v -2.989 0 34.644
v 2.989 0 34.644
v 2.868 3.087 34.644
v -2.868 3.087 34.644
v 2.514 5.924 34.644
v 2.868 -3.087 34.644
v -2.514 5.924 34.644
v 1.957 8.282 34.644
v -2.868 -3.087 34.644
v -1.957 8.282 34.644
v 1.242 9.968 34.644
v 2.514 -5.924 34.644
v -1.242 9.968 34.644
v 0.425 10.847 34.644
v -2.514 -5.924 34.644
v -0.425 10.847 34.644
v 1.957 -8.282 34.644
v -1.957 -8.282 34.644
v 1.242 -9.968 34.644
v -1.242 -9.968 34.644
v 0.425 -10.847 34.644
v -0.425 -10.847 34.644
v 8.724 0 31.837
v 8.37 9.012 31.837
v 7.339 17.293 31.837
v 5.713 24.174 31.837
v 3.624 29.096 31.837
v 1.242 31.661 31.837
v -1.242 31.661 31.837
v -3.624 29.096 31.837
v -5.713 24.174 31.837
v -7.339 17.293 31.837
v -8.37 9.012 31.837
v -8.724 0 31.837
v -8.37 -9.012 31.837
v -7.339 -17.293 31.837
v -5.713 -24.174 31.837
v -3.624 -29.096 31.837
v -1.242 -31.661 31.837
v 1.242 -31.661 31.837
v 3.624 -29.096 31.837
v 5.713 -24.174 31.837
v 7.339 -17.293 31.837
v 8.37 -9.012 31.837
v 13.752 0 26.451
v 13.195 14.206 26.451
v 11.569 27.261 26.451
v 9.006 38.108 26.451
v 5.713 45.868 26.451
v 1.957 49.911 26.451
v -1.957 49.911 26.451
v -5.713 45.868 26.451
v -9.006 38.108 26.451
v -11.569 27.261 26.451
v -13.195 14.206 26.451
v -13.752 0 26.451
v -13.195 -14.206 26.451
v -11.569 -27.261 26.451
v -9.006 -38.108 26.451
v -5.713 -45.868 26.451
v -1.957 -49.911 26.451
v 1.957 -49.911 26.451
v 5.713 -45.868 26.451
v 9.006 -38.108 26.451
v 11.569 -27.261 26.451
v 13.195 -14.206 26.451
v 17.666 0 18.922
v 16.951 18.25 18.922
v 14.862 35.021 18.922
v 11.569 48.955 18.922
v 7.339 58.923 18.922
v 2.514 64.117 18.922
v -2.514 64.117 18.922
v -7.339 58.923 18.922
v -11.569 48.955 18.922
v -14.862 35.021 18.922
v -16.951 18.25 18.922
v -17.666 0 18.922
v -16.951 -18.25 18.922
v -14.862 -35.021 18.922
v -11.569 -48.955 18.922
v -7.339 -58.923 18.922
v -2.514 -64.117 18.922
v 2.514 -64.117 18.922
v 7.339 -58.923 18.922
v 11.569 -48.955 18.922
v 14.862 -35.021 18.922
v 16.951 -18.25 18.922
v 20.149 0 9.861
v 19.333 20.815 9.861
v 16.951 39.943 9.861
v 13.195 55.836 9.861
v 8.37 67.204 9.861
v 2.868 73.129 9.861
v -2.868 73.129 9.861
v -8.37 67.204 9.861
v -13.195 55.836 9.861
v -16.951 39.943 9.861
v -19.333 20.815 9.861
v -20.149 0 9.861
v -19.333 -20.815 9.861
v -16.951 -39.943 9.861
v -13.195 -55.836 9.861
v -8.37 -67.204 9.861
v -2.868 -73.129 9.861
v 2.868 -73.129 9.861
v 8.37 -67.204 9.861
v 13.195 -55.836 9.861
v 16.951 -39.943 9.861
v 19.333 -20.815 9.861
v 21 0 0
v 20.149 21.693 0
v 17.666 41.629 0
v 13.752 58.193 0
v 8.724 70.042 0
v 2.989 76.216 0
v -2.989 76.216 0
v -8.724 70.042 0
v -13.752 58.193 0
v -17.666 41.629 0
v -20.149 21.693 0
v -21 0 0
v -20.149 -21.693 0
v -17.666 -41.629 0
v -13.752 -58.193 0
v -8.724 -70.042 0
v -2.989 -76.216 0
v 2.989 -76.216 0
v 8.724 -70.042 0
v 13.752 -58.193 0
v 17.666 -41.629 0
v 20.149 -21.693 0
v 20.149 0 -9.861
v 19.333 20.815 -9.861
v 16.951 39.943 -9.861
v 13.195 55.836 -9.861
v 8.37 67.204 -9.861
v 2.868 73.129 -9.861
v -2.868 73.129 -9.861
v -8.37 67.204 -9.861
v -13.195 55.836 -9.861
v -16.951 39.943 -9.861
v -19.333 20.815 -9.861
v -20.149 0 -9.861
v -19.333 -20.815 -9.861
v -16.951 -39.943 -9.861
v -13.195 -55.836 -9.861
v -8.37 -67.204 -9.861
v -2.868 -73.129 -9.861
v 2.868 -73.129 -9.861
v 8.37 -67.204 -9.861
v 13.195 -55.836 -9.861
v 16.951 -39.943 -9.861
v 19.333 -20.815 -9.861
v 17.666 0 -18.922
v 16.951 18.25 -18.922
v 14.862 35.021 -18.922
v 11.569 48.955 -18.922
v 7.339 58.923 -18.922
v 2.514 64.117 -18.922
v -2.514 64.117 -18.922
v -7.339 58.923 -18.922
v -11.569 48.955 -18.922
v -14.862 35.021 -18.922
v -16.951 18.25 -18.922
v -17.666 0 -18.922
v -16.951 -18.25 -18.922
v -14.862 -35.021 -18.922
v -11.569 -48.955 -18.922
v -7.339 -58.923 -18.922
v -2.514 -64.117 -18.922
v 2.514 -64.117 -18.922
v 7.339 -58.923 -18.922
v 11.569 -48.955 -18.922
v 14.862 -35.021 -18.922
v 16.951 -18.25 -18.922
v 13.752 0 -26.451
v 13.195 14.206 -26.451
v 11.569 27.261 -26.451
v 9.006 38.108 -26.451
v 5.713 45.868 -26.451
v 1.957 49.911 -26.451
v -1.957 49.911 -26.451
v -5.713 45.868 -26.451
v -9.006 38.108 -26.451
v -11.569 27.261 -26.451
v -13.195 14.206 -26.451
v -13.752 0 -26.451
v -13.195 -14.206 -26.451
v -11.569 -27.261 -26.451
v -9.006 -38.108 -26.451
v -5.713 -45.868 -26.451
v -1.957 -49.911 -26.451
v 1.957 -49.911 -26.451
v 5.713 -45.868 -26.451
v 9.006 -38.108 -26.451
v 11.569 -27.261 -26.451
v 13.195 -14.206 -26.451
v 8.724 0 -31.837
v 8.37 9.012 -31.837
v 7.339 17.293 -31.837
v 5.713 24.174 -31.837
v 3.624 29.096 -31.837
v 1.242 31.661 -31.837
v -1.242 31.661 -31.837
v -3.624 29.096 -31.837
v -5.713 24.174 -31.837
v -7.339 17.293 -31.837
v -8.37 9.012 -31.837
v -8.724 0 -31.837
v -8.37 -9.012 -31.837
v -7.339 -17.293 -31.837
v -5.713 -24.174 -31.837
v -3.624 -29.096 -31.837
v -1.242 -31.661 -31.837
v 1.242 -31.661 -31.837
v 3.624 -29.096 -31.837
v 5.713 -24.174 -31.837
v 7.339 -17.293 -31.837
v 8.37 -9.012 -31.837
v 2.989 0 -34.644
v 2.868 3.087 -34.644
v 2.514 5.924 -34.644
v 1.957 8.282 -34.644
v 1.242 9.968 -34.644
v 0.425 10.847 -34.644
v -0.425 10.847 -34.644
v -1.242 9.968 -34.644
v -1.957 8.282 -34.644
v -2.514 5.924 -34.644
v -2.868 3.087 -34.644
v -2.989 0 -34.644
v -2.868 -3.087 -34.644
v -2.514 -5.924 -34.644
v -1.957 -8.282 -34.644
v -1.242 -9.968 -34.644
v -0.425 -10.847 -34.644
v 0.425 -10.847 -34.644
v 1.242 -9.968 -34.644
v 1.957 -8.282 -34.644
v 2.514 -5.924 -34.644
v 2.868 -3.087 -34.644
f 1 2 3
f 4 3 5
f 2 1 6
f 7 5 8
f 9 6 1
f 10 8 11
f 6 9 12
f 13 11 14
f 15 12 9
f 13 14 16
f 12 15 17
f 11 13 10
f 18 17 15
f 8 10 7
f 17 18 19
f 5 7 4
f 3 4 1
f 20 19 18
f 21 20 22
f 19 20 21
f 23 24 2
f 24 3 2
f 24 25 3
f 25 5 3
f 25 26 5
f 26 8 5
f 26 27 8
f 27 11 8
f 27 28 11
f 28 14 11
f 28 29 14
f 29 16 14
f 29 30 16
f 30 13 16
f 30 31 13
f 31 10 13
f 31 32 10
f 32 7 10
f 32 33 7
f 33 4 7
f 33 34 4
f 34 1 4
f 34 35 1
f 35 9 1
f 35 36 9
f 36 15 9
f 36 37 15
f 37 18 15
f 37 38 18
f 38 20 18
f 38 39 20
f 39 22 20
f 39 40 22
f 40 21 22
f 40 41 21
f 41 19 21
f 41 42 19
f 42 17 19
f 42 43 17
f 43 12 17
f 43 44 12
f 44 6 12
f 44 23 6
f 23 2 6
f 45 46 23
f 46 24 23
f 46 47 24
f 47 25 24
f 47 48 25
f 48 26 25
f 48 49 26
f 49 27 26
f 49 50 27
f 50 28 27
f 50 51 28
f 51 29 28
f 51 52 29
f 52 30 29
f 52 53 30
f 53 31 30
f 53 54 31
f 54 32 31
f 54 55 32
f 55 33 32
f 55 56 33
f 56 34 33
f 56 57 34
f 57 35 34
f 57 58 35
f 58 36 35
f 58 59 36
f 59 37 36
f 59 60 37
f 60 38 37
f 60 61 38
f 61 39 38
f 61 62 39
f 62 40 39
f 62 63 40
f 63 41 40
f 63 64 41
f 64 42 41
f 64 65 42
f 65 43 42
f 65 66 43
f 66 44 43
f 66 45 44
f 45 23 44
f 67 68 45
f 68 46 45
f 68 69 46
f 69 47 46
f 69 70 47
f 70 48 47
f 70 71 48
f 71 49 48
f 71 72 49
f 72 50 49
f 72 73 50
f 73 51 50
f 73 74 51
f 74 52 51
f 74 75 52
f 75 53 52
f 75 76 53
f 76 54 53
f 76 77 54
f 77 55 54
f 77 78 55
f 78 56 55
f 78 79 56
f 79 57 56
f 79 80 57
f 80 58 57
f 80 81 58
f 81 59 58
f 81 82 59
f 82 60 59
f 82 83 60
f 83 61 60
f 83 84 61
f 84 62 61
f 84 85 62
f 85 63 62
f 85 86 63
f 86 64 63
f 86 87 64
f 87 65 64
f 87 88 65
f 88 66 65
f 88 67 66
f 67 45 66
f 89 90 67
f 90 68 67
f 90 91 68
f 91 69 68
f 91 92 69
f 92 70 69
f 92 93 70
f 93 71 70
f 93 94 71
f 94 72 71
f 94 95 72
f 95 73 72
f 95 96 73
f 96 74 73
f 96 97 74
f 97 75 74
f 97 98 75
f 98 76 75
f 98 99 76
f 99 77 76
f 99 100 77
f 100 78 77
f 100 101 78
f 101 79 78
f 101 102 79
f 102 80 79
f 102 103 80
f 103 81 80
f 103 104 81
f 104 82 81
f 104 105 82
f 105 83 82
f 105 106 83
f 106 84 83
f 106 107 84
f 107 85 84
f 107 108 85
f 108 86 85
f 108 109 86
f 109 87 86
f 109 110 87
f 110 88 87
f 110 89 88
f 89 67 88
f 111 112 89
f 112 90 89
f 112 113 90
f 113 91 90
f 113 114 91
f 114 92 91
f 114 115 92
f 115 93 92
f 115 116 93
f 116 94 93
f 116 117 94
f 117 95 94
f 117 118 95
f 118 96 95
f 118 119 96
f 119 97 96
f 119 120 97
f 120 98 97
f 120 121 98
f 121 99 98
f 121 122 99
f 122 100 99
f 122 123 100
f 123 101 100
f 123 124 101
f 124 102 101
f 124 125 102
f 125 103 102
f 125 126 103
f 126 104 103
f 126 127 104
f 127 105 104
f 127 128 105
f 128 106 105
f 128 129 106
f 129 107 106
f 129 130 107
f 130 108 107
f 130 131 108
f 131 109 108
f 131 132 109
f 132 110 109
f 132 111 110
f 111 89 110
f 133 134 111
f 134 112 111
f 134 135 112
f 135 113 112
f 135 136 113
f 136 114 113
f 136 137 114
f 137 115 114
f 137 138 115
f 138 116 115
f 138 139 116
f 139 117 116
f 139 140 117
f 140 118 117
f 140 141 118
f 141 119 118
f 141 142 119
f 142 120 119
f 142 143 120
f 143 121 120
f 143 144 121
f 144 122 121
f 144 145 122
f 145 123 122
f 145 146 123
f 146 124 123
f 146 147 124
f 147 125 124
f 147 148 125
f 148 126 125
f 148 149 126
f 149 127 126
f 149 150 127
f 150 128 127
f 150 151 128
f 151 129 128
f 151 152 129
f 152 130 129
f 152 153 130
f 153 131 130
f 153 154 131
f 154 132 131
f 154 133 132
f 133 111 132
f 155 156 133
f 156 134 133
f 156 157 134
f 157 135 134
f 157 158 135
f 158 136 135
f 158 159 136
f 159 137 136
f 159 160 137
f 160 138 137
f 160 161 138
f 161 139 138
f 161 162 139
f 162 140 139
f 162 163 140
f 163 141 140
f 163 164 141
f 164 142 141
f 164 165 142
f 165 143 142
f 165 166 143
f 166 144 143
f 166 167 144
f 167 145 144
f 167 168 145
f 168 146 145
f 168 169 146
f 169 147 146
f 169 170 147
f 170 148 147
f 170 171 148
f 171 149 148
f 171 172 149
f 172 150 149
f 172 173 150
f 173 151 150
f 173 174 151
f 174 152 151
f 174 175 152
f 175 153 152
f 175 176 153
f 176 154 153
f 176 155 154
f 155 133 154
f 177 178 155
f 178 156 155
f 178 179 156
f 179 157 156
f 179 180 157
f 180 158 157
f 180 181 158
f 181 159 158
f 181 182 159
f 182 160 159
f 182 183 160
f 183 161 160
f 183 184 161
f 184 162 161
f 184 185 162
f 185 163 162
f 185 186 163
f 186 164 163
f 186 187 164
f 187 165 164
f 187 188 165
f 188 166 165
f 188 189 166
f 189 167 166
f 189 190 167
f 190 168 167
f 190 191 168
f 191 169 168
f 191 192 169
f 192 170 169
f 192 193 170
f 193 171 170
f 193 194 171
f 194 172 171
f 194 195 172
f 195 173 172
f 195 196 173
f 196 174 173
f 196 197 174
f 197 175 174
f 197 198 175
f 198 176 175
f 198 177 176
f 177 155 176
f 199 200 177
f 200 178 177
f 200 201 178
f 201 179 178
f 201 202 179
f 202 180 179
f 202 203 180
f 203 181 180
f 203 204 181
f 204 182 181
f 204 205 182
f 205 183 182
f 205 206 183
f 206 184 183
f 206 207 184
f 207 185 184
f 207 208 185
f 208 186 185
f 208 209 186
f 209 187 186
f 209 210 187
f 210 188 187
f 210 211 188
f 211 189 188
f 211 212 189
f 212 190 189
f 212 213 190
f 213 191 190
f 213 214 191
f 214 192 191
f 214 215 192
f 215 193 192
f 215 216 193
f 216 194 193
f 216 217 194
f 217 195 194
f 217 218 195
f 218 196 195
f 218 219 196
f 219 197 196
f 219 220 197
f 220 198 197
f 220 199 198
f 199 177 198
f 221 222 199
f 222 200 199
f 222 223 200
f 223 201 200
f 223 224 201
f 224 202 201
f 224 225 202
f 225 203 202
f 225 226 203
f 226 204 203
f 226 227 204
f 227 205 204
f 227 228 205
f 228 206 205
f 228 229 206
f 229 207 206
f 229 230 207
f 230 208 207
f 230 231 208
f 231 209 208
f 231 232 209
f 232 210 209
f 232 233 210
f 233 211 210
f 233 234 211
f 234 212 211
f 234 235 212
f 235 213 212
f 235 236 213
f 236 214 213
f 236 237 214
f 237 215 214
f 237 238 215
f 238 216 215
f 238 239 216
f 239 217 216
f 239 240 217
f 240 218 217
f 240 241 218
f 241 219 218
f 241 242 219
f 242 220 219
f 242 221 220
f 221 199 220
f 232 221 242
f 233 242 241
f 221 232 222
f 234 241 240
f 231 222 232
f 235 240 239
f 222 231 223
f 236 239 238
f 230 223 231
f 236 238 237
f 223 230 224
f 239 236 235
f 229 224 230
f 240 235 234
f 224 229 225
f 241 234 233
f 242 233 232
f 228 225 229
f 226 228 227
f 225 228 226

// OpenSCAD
// Generated by SolidPython 1.0.1 on 2020-07-29 00:46:45


scale(v = [3, 11, 5]) {
	sphere(r = 7);
}
/***********************************************
*********      SolidPython code:      **********
************************************************
 
# import packages: SolidPython
from solid import *
from solid.utils import *
from itertools import chain, combinations, permutations


class Resize:

    def __init__(self, scad_file):
        self.scad_file = scad_file
        #self.scad_file = import_scad(scad_file)
        # cone/cylinder param:
        self.r1 = 0
        self.r2 = 0
        self.h = 0
        # rectangular prism param:
        self.w = 0
        self.l = 0
        # ellipse param:
        self.r = 0

    # import OpenScad code (file name corresponds to shape)


    # classify shape + parameters
    def assign(self, param1, param2, param3):
        if self.scad_file == 'cone.scad':
            self.r1 = param1
            self.r2 = param2
            self.h = param3
        elif self.scad_file == 'cylinder.scad':
            self.r1 = param1
            self.r2 = param2
            self.h = param3
        elif self.scad_file == 'rectangularPrism.scad':
            self.h = param1
            self.l = param2
            self.w = param3
        else:
            self.r = param1
            self.h = param2

    # resize parameters
    def iterate(self):
        x = range(3, 20, 2)
        i = 1
        if self.scad_file == 'cone.scad':
            tempList = list(permutations(x, 2))
            for temp in tempList:
                param1 = temp[0]
                param2 = temp[1]
                filepath = 'produced_scad_files/' + 'cone' + str(param1) + '_' + str(param2) + '_' + '.scad'
                scad_render_to_file(cylinder(h=param1, r1=param2, r2=0), filepath)

        elif self.scad_file == 'cylinder.scad':
            tempList = list(permutations(x, 3))
            for temp in tempList:
                param1 = temp[0]
                param2 = temp[1]
                filepath = 'produced_scad_files/' + 'cylinder' + str(param1) + '_' + str(param2) + '_' + '.scad'
                scad_render_to_file(cylinder(h=param1, r1=param2, r2=param2), filepath)

        elif self.scad_file == 'rectangularPrism.scad':
            tempList = list(permutations(x, 3))
            for temp in tempList:
                param1 = temp[0]
                param2 = temp[1]
                param3 = temp[2]
                filepath = 'produced_scad_files/' + 'rectangularPrism' + str(param1) + '_' + str(param2) + '_' + str(
                    param3) + '.scad'
                scad_render_to_file(cube(size=(param1, param2, param3)), filepath)

        elif self.scad_file == 'ellipse.scad':
            tempList = list(permutations(x, 4))
            for temp in tempList:
                param1 = temp[0]
                param2 = temp[1]
                param3 = temp[2]
                param4 = temp[3]
                filepath = 'produced_scad_files/' + 'ellipse' + str(param1) + '_' + str(param2) + '_' + str(param3) + '_' + str(param4) + '.scad'
                scad_render_to_file(scale([param1, param2, param3])(sphere(r=param4)), filepath)

    def render_to_scadfile(self):
        scad_render_to_file(scad, 'example.scad') 
 
************************************************/
